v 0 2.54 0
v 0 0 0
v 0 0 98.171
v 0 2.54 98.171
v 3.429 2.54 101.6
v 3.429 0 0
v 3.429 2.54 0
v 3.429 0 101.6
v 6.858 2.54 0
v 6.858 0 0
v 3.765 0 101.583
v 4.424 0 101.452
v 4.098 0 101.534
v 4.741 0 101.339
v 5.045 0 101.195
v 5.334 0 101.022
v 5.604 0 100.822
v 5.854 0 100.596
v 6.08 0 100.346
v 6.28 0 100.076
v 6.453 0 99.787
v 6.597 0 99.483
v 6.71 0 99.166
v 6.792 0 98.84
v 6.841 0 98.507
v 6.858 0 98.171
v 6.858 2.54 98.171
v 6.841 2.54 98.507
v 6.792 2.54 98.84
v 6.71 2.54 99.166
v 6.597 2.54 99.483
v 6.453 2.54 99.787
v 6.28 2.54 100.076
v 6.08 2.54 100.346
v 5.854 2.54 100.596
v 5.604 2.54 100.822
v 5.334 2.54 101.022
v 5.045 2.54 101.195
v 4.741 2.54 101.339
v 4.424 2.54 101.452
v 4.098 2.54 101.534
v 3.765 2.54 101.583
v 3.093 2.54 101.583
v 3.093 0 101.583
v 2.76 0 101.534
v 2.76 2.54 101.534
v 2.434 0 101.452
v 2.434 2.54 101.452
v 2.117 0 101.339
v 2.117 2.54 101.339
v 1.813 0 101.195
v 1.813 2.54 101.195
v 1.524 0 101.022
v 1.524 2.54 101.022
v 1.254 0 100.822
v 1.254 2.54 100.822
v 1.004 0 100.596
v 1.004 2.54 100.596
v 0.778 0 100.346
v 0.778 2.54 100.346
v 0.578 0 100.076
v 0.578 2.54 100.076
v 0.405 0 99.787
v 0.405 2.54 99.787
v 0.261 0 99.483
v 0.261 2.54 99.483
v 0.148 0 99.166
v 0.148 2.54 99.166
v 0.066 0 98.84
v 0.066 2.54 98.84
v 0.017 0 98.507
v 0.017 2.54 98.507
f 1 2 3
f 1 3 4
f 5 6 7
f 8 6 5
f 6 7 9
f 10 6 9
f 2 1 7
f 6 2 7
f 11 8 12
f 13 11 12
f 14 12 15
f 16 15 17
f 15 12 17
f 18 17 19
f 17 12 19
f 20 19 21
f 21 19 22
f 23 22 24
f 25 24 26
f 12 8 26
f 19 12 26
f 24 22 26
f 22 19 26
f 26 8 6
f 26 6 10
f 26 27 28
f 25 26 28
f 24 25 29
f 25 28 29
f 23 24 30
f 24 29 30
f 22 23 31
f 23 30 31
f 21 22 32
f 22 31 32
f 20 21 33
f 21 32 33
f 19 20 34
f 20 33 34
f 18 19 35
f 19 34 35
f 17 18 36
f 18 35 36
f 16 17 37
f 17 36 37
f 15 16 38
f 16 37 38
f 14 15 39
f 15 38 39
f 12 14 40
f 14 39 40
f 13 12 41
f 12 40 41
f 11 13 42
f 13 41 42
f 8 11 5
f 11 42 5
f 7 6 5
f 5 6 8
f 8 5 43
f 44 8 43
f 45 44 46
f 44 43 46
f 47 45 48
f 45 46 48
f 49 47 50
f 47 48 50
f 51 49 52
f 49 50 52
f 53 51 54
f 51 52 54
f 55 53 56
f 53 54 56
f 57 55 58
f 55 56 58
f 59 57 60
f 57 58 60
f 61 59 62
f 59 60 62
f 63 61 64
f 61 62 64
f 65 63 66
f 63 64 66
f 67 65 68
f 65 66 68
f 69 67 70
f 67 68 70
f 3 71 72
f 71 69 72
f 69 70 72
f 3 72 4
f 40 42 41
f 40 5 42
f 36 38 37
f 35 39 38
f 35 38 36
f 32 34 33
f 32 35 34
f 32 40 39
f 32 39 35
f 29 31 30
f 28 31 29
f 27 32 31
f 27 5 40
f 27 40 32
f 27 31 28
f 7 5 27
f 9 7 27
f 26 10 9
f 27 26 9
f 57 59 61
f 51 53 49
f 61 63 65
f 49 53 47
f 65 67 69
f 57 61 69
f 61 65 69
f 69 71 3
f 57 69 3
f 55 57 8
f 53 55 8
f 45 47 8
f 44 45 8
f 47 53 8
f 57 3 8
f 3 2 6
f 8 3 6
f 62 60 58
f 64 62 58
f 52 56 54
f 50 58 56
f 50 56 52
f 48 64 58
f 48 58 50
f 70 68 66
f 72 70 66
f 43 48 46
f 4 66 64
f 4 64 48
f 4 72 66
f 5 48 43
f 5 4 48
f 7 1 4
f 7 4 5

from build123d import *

# Parameters (mm, degrees)
SKETCH1_W           = 6.858
SKETCH1_H           = 2.54
BOSS_EXTRUDE1_DEPTH = 101.6
CUT_EXTRUDE1_REACH  = 103.863


with BuildPart() as part:
    # Sketch1 → Boss-Extrude1 (new body)
    with BuildSketch(Plane.XY):
        with Locations((3.429, 1.27)):
            Rectangle(SKETCH1_W, SKETCH1_H)
    extrude(amount=BOSS_EXTRUDE1_DEPTH)

    # Sketch2 → Cut-Extrude1 (cut, up to next)
    with BuildSketch(Plane(origin=(0, 2.54, 0), x_dir=(1, 0, 0), z_dir=(0, 1, 0)), mode=Mode.PRIVATE) as cut_extrude1_sk1:
        with BuildLine():
            Line((0, -101.6), (3.429, -101.6))
            ThreePointArc((3.429, -101.6), (1.004330847, -100.595669153), (0, -98.171))
            Line((0, -98.171), (0, -101.6))
        make_face()
    cut_extrude1_tool1 = extrude(cut_extrude1_sk1.sketch, amount=-CUT_EXTRUDE1_REACH, mode=Mode.PRIVATE) & part.part
    # Sketch2 → Cut-Extrude1 (cut, up to next)
    with BuildSketch(Plane(origin=(0, 2.54, 0), x_dir=(1, 0, 0), z_dir=(0, 1, 0)), mode=Mode.PRIVATE) as cut_extrude1_sk2:
        with BuildLine():
            Line((6.858, -101.6), (6.858, -98.171))
            ThreePointArc((6.858, -98.171), (5.853669153, -100.595669153), (3.429, -101.6))
            Line((3.429, -101.6), (6.858, -101.6))
        make_face()
    cut_extrude1_tool2 = extrude(cut_extrude1_sk2.sketch, amount=-CUT_EXTRUDE1_REACH, mode=Mode.PRIVATE) & part.part
    add(cut_extrude1_tool1.solids().sort_by_distance((0.765929, 2.54, 100.834071))[0], mode=Mode.SUBTRACT)
    add(cut_extrude1_tool2.solids().sort_by_distance((6.092071, 2.54, 100.834071))[0], mode=Mode.SUBTRACT)


with BuildPart() as body_2:
    # Split1: the piece on the far side of the plane
    add(part.part)
    split(bisect_by=Plane(origin=(3.429, 0, 0), x_dir=(0, 0, 1), z_dir=(1, 0, 0)), keep=Keep.BOTTOM)


with BuildPart() as part_1:
    add(part.part)

    # Split1
    split(bisect_by=Plane(origin=(3.429, 0, 0), x_dir=(0, 0, 1), z_dir=(1, 0, 0)), keep=Keep.TOP)


solid = Compound([body_2.part, part_1.part])
